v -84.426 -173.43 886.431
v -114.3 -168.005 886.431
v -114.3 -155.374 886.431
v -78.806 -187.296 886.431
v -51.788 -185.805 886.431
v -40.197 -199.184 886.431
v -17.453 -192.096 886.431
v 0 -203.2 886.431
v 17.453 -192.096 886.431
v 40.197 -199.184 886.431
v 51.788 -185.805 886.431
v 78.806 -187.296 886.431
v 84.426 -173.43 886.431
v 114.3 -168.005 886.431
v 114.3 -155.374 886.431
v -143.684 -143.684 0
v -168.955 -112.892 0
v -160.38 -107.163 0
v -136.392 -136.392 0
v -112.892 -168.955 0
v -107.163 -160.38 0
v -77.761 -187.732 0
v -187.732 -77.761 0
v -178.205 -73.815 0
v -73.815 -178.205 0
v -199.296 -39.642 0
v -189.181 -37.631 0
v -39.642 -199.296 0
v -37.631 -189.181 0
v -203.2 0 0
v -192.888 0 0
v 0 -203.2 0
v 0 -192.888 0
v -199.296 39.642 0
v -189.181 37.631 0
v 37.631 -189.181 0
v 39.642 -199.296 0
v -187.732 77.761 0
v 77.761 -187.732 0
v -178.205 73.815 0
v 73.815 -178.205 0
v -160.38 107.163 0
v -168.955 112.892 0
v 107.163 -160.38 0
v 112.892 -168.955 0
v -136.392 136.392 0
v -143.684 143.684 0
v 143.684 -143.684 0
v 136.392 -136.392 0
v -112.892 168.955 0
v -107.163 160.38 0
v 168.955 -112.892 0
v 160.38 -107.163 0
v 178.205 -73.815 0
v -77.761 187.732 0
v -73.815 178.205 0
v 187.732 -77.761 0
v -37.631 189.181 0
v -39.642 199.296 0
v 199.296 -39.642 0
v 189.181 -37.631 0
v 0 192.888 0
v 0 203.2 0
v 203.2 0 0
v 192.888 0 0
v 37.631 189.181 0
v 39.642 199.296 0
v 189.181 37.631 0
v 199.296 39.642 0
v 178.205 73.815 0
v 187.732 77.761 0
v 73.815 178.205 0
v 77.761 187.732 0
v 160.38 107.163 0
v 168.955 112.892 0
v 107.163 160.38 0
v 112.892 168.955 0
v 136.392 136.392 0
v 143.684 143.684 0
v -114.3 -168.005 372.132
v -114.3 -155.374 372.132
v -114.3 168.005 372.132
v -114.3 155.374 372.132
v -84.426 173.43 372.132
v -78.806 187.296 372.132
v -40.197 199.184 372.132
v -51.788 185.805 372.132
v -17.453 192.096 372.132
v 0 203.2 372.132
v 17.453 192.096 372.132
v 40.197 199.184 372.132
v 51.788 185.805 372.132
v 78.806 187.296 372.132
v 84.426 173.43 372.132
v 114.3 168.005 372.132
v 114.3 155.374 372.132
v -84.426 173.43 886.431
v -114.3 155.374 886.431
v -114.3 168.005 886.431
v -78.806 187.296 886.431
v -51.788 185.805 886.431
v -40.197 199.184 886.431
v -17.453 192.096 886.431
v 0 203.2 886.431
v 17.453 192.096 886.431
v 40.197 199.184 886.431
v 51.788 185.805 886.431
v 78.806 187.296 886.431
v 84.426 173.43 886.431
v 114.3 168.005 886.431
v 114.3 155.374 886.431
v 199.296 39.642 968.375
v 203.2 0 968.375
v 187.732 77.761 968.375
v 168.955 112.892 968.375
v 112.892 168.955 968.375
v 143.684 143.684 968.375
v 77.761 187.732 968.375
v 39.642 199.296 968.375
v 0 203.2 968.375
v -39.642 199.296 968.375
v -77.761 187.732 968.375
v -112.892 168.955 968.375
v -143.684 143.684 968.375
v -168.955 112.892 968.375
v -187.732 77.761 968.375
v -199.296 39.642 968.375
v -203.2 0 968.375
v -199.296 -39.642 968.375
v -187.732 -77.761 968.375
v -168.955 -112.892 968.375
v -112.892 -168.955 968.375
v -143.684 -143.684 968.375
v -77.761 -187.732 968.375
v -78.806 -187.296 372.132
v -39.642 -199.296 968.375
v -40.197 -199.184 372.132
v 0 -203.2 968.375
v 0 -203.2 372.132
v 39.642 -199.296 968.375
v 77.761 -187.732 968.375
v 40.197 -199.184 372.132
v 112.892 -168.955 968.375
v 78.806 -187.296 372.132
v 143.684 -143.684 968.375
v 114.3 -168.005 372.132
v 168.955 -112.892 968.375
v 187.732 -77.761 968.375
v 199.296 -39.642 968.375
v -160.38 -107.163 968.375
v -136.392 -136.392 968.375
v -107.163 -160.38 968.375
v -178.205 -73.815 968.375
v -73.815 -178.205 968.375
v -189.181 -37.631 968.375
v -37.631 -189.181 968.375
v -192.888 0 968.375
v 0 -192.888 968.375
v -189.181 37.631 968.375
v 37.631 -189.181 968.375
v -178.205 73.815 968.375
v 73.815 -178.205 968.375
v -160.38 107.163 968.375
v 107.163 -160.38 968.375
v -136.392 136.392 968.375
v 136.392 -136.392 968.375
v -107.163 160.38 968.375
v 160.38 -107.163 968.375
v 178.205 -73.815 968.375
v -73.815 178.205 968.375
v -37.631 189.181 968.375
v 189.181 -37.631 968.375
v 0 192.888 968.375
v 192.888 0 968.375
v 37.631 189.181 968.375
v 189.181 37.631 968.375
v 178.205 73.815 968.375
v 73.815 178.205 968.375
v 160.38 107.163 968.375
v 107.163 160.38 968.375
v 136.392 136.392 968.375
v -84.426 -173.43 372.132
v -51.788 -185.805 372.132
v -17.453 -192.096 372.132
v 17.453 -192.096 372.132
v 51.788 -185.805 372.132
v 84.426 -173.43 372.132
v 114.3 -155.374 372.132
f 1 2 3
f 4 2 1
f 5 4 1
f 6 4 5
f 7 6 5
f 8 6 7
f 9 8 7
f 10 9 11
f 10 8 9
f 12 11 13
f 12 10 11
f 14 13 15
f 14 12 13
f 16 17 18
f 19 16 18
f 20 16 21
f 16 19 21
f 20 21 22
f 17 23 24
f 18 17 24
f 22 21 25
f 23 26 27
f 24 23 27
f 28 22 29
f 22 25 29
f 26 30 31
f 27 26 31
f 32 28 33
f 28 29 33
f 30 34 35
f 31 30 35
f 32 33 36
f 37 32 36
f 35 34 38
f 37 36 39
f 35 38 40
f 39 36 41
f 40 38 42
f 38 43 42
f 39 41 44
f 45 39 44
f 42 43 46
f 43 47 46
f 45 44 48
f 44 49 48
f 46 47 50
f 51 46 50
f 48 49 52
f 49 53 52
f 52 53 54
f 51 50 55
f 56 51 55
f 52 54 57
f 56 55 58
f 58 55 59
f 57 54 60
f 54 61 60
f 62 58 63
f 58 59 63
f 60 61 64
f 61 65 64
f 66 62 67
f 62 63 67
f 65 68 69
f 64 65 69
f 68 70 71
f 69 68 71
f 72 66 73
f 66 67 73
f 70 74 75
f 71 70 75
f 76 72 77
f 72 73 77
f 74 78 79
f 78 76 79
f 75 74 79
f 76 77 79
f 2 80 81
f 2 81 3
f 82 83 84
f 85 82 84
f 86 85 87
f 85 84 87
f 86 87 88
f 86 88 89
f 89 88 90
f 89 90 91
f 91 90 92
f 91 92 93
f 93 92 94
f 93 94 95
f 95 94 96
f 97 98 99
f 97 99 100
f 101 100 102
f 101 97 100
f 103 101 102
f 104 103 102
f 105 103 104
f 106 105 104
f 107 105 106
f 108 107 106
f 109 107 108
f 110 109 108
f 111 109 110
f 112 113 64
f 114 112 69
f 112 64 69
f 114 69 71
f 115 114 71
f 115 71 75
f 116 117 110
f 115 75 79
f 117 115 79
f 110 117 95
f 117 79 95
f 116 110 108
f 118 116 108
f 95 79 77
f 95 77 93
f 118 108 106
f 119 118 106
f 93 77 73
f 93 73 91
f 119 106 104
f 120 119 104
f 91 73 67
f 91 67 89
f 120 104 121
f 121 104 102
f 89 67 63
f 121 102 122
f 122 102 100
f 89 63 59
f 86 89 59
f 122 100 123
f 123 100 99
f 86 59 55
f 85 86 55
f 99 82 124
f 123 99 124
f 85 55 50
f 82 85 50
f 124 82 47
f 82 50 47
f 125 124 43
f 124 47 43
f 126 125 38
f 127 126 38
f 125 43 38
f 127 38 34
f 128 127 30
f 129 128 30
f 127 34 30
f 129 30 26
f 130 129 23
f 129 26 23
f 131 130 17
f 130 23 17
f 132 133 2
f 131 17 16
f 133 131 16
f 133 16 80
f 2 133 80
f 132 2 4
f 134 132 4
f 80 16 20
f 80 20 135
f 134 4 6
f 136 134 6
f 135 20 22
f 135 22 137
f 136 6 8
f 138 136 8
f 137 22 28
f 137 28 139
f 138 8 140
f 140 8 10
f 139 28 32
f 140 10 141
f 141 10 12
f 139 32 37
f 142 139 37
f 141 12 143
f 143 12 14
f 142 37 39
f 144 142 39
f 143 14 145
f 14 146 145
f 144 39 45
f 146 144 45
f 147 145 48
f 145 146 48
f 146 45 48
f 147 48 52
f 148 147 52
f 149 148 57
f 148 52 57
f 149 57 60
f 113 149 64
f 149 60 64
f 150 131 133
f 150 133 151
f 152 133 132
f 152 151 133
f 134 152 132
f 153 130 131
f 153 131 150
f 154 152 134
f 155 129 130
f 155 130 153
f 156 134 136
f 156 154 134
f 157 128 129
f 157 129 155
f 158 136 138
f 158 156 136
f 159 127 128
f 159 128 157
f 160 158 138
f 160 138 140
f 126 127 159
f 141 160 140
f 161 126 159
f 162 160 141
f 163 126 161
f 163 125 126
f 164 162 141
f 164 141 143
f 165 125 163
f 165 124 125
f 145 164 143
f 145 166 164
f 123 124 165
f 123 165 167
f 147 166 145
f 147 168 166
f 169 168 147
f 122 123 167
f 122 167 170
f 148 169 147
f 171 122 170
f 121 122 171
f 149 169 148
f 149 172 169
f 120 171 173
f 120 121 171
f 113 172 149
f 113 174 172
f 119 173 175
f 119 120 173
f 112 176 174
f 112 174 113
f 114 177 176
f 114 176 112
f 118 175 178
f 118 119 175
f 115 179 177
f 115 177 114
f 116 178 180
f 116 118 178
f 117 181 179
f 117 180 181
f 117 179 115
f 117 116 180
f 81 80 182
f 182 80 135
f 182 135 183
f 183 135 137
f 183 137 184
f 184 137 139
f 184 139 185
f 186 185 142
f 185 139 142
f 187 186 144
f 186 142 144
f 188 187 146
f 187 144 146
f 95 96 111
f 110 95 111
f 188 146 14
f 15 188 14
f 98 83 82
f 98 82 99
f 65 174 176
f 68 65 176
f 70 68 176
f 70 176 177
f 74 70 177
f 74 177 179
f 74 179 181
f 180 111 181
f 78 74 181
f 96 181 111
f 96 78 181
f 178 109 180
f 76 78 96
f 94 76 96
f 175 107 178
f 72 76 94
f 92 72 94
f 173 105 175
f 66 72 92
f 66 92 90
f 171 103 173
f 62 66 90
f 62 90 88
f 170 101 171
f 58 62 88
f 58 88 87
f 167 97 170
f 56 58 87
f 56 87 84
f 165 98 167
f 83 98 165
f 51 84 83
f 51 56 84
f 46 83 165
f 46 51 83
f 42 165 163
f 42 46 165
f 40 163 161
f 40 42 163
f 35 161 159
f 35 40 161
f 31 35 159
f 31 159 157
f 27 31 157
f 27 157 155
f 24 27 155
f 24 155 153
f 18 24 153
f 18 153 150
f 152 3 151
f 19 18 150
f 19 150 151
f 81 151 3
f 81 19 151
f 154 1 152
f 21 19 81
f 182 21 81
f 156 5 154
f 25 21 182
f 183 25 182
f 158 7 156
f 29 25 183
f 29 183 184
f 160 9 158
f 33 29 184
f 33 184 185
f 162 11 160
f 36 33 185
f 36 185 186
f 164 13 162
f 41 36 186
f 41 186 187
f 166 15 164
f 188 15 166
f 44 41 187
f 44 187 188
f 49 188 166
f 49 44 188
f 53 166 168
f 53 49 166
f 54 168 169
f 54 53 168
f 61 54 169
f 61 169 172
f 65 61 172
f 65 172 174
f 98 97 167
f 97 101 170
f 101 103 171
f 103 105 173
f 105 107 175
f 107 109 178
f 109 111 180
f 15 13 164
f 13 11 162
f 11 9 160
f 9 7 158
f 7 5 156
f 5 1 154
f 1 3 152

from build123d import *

# Parameters (mm, degrees)
F0_R     = 203.2
F0_R_2   = 192.8876
F1_DEPTH = 968.375
F2_W     = 228.6
F2_H     = 514.2992
F3_DEPTH = 215.9


with BuildPart() as f1:
    # F0 (on Top) → F1 (new body)
    with BuildSketch(Plane.XY):
        Circle(F0_R)
        Circle(F0_R_2, mode=Mode.SUBTRACT)
    extrude(amount=F1_DEPTH)

    # F2 (on Front) → F3 (cut, symmetric)
    with BuildSketch(Plane.XZ):
        with Locations((0, 629.2818784714)):
            Rectangle(F2_W, F2_H)
    extrude(amount=F3_DEPTH, both=True, mode=Mode.SUBTRACT)


solid = f1.part
